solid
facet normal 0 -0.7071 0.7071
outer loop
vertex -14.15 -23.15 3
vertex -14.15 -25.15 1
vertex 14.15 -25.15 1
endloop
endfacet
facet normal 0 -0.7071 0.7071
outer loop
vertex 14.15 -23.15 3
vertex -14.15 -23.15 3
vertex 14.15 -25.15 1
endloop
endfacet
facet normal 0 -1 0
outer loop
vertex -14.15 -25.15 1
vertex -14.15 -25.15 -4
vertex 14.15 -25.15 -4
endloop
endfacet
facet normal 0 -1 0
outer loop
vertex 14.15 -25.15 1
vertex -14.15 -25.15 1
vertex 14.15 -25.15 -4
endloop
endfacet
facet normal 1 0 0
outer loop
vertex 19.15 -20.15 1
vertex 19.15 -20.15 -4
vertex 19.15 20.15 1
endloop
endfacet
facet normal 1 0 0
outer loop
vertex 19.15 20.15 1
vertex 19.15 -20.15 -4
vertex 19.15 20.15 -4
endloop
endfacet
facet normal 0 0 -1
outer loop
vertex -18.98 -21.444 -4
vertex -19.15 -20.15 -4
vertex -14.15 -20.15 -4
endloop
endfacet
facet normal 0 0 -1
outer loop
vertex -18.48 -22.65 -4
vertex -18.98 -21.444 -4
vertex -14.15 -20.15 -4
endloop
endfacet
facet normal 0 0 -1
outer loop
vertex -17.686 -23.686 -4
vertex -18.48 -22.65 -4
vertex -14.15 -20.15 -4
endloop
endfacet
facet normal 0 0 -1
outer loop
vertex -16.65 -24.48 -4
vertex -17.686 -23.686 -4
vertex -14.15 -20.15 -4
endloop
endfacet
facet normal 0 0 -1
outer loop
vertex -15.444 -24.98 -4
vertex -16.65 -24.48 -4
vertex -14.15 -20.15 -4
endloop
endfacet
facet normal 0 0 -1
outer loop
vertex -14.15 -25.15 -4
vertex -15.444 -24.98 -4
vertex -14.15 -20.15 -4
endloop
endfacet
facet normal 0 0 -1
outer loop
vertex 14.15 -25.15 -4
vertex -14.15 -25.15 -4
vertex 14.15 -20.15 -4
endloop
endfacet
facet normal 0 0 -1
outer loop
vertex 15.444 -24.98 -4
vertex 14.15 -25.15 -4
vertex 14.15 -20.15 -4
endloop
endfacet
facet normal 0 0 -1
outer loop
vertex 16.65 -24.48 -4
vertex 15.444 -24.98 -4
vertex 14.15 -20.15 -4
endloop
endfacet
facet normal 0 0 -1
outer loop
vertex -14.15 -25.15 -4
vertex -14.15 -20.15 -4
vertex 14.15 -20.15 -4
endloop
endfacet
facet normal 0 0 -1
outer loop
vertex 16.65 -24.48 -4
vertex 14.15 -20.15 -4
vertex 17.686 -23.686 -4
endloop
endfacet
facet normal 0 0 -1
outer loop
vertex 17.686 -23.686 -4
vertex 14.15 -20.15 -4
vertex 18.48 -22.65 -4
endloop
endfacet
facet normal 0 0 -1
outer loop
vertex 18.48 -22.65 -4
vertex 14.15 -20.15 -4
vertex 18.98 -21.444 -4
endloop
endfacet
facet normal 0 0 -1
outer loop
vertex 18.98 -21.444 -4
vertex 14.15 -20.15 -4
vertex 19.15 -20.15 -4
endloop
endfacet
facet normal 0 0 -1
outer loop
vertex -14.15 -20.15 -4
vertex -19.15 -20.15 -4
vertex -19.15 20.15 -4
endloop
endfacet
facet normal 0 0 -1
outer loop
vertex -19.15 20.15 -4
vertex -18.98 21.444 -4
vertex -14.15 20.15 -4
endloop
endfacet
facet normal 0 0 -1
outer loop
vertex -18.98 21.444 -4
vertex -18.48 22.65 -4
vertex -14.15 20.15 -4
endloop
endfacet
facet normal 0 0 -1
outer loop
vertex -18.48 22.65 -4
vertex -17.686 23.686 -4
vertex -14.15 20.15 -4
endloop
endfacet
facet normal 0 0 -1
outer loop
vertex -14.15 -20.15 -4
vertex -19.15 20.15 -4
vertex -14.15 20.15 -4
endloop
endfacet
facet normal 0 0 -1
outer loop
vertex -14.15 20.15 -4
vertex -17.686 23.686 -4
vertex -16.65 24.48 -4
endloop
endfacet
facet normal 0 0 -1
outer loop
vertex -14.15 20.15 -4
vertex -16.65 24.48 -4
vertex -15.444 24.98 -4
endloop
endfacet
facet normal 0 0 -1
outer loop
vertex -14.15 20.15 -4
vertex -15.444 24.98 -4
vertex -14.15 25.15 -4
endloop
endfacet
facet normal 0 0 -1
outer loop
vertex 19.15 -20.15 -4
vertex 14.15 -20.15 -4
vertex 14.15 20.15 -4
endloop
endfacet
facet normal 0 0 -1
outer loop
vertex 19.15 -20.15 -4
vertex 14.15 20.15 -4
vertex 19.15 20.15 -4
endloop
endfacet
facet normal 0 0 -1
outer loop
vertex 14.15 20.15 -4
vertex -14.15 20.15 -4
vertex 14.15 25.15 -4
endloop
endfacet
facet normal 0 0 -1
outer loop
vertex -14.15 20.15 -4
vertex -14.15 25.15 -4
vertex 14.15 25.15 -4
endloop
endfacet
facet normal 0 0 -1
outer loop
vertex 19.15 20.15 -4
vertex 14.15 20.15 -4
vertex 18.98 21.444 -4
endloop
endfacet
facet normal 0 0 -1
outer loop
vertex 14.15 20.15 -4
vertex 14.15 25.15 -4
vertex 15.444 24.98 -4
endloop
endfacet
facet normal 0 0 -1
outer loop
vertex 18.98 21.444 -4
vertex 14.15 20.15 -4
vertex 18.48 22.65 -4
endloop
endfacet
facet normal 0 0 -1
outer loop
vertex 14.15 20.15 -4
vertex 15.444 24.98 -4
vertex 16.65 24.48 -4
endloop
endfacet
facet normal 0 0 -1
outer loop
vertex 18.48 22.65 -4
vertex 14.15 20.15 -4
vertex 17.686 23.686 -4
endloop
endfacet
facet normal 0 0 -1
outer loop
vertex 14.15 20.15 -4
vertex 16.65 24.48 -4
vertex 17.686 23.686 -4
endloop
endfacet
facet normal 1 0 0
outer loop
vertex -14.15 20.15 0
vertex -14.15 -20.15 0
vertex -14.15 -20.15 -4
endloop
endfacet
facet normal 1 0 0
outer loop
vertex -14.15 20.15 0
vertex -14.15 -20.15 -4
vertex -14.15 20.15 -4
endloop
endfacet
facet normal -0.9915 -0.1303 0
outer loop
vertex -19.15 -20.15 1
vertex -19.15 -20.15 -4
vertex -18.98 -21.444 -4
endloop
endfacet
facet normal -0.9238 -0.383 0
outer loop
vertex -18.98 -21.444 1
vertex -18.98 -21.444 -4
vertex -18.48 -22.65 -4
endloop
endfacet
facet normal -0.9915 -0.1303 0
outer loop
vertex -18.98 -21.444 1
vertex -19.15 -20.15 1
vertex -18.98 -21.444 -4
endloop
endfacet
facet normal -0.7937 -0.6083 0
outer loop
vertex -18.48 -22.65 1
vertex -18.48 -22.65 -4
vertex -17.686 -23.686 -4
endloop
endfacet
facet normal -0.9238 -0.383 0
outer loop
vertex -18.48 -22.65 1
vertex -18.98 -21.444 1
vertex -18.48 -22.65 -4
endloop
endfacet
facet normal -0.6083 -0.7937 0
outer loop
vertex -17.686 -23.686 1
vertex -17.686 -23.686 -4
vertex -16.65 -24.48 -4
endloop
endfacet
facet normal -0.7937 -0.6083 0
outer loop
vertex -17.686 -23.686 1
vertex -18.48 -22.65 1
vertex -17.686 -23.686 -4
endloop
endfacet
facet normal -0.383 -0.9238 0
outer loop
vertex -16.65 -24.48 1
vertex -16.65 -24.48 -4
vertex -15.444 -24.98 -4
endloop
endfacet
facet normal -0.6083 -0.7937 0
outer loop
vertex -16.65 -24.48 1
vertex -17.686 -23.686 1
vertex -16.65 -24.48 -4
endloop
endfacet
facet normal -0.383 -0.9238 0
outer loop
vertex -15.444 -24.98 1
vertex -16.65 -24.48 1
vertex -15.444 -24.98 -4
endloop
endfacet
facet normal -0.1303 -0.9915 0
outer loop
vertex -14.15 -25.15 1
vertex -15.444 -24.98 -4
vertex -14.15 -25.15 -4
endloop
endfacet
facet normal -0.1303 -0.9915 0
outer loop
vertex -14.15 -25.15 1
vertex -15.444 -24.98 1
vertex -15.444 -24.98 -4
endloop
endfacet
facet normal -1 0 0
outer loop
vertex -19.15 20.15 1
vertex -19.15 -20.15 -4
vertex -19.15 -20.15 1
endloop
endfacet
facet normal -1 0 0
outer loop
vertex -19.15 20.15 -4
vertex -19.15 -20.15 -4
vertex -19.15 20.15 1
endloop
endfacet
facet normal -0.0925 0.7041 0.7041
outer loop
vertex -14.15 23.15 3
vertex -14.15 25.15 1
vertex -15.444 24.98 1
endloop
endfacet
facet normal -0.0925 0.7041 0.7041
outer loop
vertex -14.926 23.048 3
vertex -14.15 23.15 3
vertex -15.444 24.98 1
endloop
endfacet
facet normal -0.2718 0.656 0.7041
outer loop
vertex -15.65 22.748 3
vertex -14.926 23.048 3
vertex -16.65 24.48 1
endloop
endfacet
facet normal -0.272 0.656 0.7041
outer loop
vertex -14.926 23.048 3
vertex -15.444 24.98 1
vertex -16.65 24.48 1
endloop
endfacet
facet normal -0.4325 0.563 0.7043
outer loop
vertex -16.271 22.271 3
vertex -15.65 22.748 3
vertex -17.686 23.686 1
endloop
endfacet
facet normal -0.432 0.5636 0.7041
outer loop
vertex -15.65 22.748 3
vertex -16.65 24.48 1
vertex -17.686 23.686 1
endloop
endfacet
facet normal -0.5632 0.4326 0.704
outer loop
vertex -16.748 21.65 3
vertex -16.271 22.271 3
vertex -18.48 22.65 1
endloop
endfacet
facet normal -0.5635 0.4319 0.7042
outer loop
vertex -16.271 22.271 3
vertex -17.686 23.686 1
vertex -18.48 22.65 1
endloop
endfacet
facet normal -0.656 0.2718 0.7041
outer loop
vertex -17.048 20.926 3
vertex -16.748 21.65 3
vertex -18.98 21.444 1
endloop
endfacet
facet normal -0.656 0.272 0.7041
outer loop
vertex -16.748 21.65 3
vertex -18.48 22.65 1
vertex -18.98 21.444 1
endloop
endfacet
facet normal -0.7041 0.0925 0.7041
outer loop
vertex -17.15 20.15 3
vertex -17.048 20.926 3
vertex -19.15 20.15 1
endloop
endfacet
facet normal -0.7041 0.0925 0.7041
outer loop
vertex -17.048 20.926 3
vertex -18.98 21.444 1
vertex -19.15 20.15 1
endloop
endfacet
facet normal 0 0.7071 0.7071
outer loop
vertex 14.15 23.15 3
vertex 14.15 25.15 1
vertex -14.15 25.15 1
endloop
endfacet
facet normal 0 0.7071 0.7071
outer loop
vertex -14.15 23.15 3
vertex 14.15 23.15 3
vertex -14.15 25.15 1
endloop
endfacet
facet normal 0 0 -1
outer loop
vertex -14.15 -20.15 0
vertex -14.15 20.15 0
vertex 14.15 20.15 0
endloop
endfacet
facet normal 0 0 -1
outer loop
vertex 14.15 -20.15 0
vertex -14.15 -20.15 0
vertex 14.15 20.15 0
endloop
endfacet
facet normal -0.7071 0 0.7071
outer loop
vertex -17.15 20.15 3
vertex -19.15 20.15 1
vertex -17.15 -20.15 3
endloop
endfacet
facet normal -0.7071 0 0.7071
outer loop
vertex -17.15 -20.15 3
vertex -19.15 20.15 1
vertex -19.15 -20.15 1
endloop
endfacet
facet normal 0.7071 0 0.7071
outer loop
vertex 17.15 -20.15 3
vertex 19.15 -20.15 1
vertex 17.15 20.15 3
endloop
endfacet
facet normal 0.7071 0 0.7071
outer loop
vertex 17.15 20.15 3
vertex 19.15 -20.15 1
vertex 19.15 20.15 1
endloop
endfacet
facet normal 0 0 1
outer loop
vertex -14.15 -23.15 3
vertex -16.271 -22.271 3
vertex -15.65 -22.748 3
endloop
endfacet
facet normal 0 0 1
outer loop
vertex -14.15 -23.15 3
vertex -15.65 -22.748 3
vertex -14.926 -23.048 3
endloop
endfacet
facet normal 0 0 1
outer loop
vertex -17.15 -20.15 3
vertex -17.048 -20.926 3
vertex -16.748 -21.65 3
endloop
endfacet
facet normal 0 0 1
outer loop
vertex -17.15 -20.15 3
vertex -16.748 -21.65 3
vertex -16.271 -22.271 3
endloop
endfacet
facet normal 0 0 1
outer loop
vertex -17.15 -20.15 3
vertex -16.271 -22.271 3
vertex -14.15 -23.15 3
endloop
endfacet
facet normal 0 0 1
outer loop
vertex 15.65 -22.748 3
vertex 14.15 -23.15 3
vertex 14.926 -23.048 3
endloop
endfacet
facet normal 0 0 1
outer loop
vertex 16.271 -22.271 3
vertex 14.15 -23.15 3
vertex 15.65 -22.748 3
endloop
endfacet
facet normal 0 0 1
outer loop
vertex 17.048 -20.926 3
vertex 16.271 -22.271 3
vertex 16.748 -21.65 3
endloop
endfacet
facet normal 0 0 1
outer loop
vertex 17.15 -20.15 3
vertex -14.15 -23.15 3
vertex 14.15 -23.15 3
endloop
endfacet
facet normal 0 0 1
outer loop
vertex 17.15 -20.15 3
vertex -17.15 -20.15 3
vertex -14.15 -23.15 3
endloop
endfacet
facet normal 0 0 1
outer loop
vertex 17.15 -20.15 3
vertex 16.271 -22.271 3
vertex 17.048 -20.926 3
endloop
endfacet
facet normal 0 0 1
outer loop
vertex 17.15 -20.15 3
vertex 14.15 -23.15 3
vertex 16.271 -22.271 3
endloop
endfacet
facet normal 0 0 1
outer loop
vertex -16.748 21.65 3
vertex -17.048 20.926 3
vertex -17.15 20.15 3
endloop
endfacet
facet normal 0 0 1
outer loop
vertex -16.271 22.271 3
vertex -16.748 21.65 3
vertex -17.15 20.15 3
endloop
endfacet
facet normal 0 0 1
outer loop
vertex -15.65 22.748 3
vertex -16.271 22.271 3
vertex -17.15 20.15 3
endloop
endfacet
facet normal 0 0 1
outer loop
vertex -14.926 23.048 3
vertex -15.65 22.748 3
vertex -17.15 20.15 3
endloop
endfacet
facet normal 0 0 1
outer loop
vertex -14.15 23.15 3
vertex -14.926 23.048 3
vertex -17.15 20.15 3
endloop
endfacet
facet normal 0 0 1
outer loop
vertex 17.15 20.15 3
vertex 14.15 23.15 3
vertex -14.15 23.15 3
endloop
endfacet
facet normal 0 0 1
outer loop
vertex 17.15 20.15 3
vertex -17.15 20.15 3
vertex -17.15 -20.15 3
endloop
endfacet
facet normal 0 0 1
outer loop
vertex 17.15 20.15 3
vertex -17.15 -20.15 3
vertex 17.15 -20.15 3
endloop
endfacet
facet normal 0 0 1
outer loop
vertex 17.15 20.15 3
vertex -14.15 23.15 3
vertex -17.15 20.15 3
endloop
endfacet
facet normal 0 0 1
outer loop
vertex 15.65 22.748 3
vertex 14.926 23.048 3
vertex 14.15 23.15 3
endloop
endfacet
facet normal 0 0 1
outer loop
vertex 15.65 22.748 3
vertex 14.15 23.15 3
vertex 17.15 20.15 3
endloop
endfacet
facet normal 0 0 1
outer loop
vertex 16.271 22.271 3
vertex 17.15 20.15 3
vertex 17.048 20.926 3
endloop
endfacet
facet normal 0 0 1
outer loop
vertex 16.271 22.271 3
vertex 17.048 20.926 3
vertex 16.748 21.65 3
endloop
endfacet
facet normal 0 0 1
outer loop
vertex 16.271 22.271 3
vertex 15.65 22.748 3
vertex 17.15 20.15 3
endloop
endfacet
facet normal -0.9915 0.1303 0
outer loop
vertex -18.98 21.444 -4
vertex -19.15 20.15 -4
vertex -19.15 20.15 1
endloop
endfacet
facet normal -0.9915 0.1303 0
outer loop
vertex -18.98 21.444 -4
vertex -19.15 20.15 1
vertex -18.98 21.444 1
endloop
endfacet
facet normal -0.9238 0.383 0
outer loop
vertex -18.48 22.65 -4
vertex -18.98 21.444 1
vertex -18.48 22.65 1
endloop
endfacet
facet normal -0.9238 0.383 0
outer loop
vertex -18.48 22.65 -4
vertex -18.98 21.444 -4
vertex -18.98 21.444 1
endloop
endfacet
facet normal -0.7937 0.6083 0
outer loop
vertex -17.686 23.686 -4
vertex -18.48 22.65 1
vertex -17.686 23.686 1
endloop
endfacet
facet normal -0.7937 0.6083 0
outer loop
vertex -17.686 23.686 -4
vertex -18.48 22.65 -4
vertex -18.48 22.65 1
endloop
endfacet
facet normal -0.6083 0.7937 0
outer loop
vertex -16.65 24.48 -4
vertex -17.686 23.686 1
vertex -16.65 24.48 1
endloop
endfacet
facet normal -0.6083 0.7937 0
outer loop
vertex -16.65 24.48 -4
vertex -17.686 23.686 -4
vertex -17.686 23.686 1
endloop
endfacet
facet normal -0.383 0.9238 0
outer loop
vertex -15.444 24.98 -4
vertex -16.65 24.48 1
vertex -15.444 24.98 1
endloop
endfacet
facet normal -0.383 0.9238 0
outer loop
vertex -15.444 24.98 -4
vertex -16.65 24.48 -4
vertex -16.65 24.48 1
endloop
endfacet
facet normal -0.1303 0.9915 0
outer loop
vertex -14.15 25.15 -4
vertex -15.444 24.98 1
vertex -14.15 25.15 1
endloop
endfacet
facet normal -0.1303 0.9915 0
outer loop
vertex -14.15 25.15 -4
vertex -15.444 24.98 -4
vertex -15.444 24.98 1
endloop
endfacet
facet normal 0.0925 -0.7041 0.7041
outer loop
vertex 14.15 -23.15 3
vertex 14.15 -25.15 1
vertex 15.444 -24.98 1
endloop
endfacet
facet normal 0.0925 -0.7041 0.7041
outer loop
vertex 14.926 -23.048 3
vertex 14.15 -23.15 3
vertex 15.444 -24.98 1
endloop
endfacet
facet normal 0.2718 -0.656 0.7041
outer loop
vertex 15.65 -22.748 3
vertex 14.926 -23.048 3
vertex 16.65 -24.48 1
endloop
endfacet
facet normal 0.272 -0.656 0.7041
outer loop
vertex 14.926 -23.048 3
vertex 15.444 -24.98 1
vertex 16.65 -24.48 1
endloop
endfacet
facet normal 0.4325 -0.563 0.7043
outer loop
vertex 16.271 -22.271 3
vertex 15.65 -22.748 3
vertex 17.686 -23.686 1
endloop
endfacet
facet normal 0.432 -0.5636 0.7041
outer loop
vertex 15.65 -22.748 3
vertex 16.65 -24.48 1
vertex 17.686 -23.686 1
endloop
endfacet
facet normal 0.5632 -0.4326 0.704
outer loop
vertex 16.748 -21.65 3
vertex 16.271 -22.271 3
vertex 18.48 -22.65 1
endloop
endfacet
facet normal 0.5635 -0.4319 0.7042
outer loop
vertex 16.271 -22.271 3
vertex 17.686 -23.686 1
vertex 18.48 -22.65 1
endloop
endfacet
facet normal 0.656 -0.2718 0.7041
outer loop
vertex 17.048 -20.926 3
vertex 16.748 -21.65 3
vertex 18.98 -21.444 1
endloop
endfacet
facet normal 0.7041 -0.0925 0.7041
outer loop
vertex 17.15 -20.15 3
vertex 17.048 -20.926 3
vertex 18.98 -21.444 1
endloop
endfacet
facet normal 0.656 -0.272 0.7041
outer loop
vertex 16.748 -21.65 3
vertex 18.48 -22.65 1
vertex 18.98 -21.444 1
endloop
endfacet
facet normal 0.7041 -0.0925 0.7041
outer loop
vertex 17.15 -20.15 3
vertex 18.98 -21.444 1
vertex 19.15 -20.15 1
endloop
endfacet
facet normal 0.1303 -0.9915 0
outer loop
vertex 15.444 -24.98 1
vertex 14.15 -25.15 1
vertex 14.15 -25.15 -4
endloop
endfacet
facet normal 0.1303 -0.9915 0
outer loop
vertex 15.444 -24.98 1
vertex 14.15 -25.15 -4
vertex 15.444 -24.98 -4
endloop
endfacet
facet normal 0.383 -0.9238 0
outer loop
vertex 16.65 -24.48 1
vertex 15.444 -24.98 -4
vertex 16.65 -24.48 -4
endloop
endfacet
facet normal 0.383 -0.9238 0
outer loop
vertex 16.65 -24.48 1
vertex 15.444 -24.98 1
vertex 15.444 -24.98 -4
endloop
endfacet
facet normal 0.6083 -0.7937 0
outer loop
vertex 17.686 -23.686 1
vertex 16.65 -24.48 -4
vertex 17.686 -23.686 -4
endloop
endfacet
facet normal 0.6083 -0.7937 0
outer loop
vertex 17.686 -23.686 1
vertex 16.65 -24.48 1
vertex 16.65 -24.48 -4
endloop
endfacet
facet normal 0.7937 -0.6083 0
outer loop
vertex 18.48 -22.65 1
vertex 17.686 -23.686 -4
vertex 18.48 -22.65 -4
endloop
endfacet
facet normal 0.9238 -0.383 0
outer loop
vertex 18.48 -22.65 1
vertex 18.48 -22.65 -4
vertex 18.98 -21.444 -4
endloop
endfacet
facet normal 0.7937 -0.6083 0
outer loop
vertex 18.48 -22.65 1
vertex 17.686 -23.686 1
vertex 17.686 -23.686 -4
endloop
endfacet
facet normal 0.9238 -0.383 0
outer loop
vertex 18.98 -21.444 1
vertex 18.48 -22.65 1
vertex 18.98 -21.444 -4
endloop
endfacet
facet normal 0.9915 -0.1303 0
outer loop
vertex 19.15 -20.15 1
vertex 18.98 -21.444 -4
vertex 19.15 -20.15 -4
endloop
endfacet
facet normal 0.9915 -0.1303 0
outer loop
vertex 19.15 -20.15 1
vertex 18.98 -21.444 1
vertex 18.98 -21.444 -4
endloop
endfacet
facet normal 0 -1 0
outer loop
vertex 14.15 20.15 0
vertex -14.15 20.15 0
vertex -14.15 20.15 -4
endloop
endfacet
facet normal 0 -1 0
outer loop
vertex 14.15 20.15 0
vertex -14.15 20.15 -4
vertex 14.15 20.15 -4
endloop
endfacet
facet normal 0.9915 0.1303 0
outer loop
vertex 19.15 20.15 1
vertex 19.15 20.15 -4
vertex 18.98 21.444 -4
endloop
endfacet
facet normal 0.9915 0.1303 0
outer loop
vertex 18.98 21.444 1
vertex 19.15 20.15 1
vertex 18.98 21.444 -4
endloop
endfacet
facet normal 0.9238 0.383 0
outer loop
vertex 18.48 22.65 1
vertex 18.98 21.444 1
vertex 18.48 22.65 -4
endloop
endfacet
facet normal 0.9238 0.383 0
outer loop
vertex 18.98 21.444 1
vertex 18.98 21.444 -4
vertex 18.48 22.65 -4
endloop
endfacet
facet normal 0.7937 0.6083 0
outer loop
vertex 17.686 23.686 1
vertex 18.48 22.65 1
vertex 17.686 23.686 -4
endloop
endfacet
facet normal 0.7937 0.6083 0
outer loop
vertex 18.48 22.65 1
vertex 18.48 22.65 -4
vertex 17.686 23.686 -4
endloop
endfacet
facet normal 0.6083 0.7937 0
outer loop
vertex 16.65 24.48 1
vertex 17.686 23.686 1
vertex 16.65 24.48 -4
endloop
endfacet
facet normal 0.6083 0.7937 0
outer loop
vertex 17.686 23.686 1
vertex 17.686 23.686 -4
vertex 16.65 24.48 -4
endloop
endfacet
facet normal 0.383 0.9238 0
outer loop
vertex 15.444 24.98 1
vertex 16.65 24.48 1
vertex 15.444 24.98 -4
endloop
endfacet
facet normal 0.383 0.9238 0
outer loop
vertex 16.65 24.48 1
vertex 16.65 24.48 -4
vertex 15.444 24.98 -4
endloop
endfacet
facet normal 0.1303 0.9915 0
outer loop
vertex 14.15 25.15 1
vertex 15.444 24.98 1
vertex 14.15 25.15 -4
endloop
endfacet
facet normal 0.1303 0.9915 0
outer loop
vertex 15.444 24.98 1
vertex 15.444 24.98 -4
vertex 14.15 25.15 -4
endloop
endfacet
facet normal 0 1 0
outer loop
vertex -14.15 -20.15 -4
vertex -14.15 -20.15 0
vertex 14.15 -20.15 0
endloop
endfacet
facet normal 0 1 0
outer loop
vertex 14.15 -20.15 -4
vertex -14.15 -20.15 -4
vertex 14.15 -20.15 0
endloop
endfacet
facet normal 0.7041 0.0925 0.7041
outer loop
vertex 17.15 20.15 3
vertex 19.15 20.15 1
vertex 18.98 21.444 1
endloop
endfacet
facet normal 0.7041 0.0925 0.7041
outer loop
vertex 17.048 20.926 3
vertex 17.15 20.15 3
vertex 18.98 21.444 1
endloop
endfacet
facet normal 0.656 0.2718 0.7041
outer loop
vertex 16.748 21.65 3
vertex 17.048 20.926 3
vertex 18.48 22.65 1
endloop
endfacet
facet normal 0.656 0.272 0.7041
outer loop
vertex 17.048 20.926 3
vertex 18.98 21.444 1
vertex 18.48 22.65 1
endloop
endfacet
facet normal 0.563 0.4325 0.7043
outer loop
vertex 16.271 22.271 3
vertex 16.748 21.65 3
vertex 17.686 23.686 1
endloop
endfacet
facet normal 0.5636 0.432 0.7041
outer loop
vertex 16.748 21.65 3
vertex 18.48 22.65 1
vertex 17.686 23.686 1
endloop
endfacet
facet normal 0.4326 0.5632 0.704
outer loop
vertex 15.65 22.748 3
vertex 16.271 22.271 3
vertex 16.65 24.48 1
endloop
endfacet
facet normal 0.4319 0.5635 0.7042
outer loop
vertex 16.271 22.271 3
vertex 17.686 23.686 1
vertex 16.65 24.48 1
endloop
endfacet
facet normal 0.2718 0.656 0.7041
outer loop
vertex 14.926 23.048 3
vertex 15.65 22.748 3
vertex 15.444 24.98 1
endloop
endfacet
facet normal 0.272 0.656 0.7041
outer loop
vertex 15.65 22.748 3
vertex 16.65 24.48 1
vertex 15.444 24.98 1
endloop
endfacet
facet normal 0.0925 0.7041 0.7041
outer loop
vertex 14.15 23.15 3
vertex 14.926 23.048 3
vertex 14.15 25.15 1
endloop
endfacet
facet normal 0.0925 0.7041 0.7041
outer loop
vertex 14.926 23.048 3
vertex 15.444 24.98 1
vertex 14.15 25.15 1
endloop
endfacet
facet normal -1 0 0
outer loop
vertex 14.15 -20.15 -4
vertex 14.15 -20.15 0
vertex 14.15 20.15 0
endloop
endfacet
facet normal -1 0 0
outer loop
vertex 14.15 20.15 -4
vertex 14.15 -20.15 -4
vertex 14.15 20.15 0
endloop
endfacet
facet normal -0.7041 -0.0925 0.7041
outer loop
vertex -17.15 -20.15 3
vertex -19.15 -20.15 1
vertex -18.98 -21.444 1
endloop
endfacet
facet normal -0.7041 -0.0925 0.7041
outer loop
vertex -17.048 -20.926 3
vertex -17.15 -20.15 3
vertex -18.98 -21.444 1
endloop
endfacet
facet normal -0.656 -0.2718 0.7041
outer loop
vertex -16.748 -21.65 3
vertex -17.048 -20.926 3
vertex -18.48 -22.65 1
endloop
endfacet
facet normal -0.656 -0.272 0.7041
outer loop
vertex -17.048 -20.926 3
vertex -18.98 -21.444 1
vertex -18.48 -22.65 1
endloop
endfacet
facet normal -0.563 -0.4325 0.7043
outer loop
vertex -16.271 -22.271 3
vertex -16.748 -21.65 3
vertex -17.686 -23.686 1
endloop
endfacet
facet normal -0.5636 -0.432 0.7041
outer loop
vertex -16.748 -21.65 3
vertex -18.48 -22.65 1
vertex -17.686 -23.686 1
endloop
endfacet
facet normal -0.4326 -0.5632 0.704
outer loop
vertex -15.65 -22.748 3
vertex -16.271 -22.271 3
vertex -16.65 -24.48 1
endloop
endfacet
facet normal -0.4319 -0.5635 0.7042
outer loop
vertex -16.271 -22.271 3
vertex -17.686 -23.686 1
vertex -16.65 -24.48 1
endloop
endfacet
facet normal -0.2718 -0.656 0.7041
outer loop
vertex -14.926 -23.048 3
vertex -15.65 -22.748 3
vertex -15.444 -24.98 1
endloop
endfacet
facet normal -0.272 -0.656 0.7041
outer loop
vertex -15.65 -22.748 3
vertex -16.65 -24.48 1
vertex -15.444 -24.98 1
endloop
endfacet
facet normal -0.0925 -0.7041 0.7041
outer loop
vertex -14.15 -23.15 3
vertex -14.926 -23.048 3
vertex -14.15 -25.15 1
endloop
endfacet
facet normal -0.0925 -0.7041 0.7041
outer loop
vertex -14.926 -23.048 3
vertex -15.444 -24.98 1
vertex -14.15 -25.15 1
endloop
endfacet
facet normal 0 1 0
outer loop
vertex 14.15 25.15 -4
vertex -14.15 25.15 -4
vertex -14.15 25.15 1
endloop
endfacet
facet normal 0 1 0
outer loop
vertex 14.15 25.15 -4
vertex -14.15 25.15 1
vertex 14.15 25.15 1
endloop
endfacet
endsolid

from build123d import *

# Parameters (mm, degrees)
F0_W     = 38.3
F0_H     = 50.3
F0_W_2   = 28.3
F0_H_2   = 40.3
F2_DEPTH = 4
F3_DEPTH = 3
F4_R     = 5
F5_SIZE  = 2


with BuildPart() as f2:
    # F0 (on Top) → F2 (new body)
    with BuildSketch(Plane.XY):
        Rectangle(F0_W, F0_H)
        Rectangle(F0_W_2, F0_H_2, mode=Mode.SUBTRACT)
    extrude(amount=-F2_DEPTH)

    # F0 (on Top) → F3 (join)
    with BuildSketch(Plane.XY):
        Rectangle(F0_W, F0_H)
        Rectangle(F0_W_2, F0_H_2, mode=Mode.SUBTRACT)
        Rectangle(F0_W_2, F0_H_2)
    extrude(amount=F3_DEPTH)

    # F4
    f4_edges = [f2.edges().sort_by_distance(p)[0] for p in [
        (-19.15, -25.15, -0.5),
        (-19.15, 25.15, -0.5),
        (19.15, 25.15, -0.5),
        (19.15, -25.15, -0.5),
    ]]
    fillet(f4_edges, radius=F4_R)

    # F5
    f5_edges = [f2.edges().sort_by_distance(p)[0] for p in [
        (19.15, 0, 3),
        (17.685534, -23.685534, 3),
        (17.685534, 23.685534, 3),
        (0, -25.15, 3),
        (0, 25.15, 3),
        (-17.685534, -23.685534, 3),
        (-17.685534, 23.685534, 3),
        (-19.15, 0, 3),
    ]]
    chamfer(f5_edges, length=F5_SIZE)


solid = f2.part
